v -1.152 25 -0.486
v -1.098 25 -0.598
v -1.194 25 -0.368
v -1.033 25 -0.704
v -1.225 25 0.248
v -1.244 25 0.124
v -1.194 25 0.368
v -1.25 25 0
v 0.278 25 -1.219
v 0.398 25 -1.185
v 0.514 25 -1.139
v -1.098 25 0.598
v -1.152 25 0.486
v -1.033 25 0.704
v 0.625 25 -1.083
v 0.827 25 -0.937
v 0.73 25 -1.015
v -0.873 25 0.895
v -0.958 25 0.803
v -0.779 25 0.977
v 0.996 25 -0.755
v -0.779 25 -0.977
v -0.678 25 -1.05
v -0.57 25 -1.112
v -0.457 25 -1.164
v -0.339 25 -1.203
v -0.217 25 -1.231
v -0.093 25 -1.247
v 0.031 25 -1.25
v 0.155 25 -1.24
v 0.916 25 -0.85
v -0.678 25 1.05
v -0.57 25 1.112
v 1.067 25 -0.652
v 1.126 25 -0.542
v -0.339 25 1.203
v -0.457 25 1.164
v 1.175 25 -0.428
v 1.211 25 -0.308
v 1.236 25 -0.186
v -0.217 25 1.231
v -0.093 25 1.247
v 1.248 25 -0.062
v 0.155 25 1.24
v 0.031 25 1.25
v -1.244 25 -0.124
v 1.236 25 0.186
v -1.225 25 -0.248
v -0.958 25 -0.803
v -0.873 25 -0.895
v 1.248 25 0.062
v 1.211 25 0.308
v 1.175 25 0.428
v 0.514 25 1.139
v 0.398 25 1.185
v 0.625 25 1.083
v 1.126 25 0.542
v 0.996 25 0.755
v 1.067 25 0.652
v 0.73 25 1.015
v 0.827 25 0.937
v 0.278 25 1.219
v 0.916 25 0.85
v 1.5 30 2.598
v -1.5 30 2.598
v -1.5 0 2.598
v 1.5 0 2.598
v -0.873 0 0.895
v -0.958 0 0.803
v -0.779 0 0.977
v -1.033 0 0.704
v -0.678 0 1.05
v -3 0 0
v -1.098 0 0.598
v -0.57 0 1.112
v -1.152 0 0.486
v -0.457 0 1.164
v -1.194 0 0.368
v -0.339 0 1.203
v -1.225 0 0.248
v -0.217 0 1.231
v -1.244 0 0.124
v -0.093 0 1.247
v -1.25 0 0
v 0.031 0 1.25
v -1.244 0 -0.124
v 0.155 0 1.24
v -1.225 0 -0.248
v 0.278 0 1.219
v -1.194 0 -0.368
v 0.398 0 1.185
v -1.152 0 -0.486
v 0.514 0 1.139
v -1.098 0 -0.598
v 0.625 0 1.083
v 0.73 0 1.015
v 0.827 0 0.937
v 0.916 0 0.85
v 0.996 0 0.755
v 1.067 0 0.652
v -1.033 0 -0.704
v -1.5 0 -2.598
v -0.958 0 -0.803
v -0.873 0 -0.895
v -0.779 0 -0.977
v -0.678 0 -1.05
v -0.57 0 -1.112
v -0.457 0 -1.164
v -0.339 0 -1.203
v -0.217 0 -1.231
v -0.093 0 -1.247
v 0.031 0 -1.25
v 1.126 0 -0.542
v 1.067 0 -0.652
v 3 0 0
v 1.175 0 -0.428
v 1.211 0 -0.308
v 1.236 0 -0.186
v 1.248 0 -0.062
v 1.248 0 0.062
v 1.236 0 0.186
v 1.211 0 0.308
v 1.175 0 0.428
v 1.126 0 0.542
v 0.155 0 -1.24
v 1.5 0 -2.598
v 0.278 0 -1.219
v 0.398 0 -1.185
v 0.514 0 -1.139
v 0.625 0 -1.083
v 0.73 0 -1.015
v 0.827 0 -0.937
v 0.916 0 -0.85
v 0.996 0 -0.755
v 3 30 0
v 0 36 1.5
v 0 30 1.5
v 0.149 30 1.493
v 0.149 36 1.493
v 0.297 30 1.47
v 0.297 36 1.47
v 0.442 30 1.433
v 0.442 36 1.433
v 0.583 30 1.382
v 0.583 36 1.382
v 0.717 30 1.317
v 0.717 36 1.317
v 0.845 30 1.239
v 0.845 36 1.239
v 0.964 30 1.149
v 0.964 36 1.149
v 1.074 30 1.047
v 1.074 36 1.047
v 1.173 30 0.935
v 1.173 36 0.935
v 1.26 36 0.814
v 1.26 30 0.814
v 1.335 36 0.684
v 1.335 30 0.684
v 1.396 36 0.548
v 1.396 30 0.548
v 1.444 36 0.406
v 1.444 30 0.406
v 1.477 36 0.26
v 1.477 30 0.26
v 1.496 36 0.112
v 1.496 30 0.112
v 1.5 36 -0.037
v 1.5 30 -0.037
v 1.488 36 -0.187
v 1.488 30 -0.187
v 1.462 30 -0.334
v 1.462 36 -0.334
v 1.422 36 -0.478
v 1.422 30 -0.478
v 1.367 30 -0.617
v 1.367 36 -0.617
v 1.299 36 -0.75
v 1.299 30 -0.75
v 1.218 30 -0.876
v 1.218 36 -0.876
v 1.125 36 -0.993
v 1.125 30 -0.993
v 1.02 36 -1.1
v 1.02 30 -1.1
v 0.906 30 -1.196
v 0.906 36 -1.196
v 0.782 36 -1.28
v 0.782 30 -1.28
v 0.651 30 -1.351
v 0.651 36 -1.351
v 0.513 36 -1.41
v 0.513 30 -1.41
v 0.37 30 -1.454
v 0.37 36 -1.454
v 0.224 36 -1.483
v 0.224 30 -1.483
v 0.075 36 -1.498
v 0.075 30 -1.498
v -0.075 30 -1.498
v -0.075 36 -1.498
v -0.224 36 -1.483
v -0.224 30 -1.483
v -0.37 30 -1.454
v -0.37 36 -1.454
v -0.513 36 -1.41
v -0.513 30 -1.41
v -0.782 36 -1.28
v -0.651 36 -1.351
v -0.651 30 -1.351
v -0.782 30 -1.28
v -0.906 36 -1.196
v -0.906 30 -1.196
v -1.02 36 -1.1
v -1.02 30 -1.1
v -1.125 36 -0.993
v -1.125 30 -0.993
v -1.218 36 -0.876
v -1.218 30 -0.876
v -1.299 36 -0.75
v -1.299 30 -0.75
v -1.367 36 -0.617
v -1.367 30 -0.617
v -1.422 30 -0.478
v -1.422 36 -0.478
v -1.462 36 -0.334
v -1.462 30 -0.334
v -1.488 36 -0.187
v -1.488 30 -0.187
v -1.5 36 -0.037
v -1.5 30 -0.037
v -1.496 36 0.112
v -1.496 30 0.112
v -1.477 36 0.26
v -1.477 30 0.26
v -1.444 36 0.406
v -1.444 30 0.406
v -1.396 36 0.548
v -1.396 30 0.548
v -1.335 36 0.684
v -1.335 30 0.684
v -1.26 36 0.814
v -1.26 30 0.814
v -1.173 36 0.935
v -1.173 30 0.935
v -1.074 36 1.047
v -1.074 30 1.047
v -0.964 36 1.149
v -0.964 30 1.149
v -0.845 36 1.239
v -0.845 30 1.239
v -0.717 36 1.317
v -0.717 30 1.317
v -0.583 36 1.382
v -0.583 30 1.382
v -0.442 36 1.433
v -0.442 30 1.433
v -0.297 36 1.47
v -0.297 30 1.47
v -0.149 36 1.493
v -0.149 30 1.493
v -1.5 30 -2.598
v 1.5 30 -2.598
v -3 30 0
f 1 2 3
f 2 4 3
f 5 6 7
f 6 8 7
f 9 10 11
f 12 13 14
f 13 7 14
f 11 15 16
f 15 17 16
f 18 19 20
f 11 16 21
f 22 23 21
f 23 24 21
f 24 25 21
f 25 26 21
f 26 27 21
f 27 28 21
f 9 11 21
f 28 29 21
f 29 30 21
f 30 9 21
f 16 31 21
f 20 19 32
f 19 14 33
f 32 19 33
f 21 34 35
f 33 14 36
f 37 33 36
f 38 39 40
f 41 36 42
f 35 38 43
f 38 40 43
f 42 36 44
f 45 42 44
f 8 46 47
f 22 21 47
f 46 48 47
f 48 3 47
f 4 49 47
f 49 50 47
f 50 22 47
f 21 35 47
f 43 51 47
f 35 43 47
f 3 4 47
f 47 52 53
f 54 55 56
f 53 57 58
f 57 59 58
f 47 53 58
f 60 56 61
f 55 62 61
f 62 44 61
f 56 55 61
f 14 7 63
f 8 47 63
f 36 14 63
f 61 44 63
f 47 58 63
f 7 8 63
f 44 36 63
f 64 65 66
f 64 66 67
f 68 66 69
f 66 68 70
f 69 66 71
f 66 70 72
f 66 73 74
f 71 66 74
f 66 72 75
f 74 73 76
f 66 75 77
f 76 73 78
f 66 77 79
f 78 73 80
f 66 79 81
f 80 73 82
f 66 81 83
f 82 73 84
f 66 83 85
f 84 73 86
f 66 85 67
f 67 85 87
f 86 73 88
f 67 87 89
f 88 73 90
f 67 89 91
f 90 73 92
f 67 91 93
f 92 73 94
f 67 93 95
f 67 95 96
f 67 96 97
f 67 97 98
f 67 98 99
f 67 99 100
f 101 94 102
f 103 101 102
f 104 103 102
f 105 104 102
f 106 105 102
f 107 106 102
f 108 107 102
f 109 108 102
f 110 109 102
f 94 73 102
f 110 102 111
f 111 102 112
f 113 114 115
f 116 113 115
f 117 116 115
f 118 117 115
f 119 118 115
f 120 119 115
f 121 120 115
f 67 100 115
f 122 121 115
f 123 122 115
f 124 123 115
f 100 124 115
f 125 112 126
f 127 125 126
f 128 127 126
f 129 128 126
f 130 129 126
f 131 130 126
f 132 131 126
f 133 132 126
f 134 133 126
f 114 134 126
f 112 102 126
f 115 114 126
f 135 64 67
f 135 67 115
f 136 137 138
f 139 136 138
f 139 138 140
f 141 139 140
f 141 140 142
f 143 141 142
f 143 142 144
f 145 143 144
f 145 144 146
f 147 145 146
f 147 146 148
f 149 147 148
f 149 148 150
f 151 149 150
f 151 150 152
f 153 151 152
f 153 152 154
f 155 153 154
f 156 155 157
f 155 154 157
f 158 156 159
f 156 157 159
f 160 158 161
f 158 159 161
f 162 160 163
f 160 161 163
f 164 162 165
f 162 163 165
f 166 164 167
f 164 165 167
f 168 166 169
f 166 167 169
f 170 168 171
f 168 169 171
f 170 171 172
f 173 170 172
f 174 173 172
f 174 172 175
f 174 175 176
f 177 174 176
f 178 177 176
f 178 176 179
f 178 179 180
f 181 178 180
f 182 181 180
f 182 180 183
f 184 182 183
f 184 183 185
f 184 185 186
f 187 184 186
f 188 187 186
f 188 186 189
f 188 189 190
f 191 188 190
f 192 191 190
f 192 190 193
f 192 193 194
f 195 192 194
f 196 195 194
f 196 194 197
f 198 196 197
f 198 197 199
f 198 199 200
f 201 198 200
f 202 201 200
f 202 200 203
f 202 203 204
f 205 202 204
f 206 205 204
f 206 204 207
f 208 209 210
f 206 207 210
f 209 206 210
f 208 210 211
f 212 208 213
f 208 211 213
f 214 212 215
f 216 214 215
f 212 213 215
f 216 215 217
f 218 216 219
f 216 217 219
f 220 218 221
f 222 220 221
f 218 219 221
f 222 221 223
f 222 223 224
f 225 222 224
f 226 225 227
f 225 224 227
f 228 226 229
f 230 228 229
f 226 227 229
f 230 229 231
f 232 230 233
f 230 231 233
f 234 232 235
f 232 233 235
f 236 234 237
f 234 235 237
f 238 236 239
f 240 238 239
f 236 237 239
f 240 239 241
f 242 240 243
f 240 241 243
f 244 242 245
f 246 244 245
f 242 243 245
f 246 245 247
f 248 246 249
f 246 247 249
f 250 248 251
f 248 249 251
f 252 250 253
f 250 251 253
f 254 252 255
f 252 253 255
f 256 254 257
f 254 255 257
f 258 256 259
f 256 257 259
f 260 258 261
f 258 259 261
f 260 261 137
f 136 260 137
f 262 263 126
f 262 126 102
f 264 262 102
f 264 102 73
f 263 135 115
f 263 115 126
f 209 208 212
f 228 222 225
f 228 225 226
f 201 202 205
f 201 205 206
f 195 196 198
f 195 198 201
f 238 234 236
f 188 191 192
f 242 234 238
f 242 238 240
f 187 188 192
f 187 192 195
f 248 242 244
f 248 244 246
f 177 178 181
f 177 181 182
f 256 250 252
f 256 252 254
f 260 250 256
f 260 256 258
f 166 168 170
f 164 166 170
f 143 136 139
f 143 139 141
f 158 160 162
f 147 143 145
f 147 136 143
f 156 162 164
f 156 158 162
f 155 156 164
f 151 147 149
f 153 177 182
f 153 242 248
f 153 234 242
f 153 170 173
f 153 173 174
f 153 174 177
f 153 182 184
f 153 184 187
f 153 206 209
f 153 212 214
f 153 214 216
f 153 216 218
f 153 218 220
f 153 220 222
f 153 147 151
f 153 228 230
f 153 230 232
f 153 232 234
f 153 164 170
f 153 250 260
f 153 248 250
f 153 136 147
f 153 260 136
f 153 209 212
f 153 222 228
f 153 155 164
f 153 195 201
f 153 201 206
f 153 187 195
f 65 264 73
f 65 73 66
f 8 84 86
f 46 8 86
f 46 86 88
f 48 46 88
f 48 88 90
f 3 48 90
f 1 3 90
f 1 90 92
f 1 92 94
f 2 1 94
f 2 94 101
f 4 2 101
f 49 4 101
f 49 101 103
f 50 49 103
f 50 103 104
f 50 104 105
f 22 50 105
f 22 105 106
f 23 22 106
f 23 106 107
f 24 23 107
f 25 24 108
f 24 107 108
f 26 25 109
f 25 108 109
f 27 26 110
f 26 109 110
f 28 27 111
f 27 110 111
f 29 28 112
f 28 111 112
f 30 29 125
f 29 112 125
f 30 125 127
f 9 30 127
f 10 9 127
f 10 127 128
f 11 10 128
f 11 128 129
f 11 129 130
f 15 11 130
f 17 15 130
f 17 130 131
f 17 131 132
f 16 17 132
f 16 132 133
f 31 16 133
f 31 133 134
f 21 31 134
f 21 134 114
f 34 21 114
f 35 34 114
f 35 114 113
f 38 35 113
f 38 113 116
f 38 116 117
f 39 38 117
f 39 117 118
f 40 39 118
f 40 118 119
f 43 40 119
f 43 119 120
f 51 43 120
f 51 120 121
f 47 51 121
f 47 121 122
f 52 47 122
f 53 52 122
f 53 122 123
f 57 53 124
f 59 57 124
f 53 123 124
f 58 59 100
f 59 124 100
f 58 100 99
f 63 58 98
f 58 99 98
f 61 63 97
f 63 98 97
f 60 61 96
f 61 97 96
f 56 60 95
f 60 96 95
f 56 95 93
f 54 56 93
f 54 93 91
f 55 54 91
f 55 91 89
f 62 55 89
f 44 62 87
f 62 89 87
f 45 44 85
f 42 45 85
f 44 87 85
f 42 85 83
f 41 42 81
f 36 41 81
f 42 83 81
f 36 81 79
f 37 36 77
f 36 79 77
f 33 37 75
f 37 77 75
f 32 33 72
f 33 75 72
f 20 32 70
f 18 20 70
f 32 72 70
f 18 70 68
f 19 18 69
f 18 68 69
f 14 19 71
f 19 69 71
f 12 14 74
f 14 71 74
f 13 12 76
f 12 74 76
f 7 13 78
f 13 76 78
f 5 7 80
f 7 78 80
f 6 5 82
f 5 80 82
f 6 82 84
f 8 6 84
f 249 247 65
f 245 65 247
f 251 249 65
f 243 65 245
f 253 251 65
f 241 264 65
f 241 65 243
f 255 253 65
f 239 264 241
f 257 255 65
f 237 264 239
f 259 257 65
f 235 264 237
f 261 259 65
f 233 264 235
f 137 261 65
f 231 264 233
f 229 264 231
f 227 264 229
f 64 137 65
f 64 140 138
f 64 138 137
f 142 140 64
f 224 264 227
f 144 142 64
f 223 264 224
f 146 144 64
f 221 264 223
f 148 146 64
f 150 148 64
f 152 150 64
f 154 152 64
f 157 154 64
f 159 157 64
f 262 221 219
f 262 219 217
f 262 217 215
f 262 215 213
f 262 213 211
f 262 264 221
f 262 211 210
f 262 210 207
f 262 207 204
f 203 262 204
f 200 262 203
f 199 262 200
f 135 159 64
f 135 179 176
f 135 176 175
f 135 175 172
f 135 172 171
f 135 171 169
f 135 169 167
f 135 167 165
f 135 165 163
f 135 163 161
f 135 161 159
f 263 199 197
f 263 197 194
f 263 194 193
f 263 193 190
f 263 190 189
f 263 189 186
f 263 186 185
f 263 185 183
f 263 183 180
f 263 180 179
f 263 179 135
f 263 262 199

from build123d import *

# Parameters (mm, degrees)
EXTRUDE_1_DEPTH      = 30
HOLE_WIZARD_M3_1_D   = 2.5
EXTRUDE_3_DEPTH      = 6
EXTRUDE_3_DEPTH_BACK = 5
SKETCH_4_R           = 1.5


with BuildPart() as part:
    # 草图1 → 凸台-拉伸1 (new body)
    with BuildSketch(Plane(origin=(0, 0, 0), x_dir=(1, 0, 0), z_dir=(0, 1, 0))):
        Polygon((1.5, 2.598076211), (-1.5, 2.598076211), (-3, 0), (-1.5, -2.598076211), (1.5, -2.598076211), (3, 0), align=None)
    extrude(amount=EXTRUDE_1_DEPTH)

    # M3 螺纹孔1 (through all)
    with Locations(Plane(origin=(0, 30, 0), x_dir=(1, 0, 0), z_dir=(0, 1, 0))):
        with Locations((0, 0)):
            Hole(HOLE_WIZARD_M3_1_D / 2)

    # 草图4 → 凸台-拉伸3 (add, two sides: drawn at the far end of the back side and taken through both)
    with BuildSketch(Plane(origin=(0, 30, 0), x_dir=(1, 0, 0), z_dir=(0, 1, 0)).offset(-EXTRUDE_3_DEPTH_BACK)):
        with Locations(Location((0, 0, 0), (0, 0, 270))):
            Circle(SKETCH_4_R)
    extrude(amount=EXTRUDE_3_DEPTH + EXTRUDE_3_DEPTH_BACK)


solid = part.part
